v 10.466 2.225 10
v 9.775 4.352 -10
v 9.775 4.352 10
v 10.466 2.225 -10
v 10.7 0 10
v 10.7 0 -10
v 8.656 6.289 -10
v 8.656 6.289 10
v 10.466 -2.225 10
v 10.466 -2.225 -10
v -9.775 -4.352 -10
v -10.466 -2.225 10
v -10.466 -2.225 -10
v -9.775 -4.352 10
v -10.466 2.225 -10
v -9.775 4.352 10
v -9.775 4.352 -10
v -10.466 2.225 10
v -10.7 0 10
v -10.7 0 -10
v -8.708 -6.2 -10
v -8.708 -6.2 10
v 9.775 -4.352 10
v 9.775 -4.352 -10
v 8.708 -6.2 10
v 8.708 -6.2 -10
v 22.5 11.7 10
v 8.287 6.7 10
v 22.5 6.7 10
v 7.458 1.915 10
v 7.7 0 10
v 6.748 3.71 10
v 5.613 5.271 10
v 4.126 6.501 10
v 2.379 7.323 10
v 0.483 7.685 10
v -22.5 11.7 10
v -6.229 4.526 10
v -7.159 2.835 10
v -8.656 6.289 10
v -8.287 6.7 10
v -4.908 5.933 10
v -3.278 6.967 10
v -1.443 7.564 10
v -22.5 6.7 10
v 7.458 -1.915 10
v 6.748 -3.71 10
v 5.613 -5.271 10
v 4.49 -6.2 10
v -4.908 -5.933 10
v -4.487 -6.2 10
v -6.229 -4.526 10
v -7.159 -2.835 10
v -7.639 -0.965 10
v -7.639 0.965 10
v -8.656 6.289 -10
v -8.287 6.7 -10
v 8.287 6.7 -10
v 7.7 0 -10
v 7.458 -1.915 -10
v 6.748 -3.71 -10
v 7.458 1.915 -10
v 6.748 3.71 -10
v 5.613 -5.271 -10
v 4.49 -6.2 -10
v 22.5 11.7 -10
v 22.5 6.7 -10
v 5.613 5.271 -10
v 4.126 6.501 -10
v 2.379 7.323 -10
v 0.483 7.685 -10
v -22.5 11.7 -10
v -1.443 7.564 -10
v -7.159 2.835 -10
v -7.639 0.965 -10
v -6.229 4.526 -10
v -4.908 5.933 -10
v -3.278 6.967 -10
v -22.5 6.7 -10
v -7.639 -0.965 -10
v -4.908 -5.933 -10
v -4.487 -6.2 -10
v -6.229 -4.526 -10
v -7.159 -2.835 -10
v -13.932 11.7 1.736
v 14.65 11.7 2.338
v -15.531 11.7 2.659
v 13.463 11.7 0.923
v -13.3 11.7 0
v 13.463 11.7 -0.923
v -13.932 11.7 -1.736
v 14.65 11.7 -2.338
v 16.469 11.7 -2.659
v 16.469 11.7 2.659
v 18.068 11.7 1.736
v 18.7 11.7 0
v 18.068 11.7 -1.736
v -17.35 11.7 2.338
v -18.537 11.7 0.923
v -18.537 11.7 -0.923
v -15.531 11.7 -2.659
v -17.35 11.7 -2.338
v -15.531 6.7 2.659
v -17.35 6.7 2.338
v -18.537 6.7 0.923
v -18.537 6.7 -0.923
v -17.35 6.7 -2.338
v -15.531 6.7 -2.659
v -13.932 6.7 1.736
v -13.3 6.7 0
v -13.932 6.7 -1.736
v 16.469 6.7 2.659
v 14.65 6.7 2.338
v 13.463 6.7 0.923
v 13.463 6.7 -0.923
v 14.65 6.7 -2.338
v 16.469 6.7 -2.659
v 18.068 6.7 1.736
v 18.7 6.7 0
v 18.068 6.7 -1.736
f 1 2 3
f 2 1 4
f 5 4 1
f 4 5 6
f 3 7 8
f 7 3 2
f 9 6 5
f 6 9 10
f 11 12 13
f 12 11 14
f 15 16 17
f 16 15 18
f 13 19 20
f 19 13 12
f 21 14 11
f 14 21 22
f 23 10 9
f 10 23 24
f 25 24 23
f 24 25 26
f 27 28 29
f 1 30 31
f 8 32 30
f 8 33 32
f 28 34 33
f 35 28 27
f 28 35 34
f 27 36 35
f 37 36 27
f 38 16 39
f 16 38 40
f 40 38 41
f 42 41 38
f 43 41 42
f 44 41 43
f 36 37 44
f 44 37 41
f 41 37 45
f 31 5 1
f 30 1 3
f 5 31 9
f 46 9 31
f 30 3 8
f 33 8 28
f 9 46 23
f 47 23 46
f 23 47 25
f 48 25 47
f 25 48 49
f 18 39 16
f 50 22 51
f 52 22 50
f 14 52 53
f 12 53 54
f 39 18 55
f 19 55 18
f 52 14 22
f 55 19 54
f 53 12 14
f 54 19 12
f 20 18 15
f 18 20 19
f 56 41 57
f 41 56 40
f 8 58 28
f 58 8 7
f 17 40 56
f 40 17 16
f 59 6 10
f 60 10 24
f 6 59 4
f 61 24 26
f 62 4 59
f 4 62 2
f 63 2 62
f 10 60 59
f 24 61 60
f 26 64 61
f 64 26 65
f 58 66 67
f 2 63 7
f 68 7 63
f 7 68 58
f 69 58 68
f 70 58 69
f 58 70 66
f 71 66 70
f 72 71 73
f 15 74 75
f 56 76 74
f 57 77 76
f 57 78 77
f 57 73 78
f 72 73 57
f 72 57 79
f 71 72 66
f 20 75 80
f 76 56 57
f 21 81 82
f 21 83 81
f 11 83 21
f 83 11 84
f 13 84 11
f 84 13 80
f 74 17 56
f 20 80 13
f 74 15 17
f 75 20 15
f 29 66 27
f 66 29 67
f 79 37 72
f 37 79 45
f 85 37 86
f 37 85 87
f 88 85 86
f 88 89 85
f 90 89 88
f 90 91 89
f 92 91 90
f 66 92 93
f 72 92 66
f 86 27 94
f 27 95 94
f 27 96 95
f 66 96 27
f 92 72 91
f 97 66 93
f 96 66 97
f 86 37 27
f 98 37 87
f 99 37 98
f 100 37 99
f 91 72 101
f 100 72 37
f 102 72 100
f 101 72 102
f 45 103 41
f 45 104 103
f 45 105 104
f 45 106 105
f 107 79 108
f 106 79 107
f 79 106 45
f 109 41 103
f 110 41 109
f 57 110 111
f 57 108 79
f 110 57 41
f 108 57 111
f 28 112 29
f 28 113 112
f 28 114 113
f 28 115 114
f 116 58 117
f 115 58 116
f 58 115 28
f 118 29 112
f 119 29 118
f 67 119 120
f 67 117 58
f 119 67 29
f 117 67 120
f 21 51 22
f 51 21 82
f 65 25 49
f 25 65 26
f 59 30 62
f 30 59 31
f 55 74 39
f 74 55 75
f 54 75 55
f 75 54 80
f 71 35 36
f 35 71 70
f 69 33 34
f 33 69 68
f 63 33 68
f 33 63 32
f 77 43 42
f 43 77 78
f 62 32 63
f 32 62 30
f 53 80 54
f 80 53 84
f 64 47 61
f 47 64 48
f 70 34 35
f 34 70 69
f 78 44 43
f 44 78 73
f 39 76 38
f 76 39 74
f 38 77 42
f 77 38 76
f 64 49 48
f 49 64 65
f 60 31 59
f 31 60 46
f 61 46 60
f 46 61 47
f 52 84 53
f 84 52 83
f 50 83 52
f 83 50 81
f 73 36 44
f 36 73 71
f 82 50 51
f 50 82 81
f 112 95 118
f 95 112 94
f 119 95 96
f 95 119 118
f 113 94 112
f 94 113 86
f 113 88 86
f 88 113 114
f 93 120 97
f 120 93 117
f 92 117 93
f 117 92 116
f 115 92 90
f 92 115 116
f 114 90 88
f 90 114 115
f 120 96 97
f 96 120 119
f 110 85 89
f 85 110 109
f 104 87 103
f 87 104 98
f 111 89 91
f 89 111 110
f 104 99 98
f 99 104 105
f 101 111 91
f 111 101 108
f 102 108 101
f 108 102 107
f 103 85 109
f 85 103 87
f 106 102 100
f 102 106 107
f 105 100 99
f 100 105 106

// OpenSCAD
// file: Rook_Config.scad
// Rook 3D Printer Configuration
// Created By Jeffrey Olijar 
// Jolijar@gmail.com

// Layer Height
LH = 0.38;

// 608 skate bearing
Bearing_OD = 22.5; 
Bearing_ID = 8;
Bearing_H = 7;

// M3 Nut Diameter
N3 = 7.5;

// M4 Screw Hole Diameter
M4 = 4;

// M5 Screw Hole Diameter
M5 = 5.4;

// M8 Rod Diameter (configure for a tight fit)
M8 = 8.2;

// M8 Nut Diameter
N8 = 15.5;

//LM8UU Bearing
LBD = 15.4; // Diameter
LBH = 25; // Height
LBI = 8;  // Inner Diameter

//Makergear Groovemount
GVO = 16.5; // Outside Diameter
GVI = 12.5;  // Inside Groove Diameter

// Distance Between Centers for X rods
DBCX = 70;
// main file
// Rook 3D Printer 
// Rook Y Bearing
// Created By Jeffrey Olijar 
// Jolijar@gmail.com
// Revision 1.02
// 4 x required 

include <Rook_Config.scad> 


module Rook_Y_Bearing(){

difference(){ 
	union(){

		cylinder(h=20,r=LBD/2+3, center = true);
		translate (v=[0,LBD/2+1.5,0]){ 
			cube(size =[45,5,20], center = true); 
			}	
		}

	union(){
translate (v=[0,-LBD/2-1,0]){ 
			cube(size =[20,5,25], center = true); 
			}
		cylinder(h=LBH,r=LBD/2, center = true);
		translate (v=[0,-LBD/2,0]){ 
			cube(size =[M8,M8,25], center = true); 
			}
		rotate(a=[90,0,0])translate(v=[16,0,0]){ 
			cylinder(h=50,r=M5/2, center = true);
			}
		rotate(a=[90,0,0])translate(v=[-16,0,0]){ 
			cylinder(h=50,r=M5/2, center = true);
			}

		}
	}
}

Rook_Y_Bearing();
